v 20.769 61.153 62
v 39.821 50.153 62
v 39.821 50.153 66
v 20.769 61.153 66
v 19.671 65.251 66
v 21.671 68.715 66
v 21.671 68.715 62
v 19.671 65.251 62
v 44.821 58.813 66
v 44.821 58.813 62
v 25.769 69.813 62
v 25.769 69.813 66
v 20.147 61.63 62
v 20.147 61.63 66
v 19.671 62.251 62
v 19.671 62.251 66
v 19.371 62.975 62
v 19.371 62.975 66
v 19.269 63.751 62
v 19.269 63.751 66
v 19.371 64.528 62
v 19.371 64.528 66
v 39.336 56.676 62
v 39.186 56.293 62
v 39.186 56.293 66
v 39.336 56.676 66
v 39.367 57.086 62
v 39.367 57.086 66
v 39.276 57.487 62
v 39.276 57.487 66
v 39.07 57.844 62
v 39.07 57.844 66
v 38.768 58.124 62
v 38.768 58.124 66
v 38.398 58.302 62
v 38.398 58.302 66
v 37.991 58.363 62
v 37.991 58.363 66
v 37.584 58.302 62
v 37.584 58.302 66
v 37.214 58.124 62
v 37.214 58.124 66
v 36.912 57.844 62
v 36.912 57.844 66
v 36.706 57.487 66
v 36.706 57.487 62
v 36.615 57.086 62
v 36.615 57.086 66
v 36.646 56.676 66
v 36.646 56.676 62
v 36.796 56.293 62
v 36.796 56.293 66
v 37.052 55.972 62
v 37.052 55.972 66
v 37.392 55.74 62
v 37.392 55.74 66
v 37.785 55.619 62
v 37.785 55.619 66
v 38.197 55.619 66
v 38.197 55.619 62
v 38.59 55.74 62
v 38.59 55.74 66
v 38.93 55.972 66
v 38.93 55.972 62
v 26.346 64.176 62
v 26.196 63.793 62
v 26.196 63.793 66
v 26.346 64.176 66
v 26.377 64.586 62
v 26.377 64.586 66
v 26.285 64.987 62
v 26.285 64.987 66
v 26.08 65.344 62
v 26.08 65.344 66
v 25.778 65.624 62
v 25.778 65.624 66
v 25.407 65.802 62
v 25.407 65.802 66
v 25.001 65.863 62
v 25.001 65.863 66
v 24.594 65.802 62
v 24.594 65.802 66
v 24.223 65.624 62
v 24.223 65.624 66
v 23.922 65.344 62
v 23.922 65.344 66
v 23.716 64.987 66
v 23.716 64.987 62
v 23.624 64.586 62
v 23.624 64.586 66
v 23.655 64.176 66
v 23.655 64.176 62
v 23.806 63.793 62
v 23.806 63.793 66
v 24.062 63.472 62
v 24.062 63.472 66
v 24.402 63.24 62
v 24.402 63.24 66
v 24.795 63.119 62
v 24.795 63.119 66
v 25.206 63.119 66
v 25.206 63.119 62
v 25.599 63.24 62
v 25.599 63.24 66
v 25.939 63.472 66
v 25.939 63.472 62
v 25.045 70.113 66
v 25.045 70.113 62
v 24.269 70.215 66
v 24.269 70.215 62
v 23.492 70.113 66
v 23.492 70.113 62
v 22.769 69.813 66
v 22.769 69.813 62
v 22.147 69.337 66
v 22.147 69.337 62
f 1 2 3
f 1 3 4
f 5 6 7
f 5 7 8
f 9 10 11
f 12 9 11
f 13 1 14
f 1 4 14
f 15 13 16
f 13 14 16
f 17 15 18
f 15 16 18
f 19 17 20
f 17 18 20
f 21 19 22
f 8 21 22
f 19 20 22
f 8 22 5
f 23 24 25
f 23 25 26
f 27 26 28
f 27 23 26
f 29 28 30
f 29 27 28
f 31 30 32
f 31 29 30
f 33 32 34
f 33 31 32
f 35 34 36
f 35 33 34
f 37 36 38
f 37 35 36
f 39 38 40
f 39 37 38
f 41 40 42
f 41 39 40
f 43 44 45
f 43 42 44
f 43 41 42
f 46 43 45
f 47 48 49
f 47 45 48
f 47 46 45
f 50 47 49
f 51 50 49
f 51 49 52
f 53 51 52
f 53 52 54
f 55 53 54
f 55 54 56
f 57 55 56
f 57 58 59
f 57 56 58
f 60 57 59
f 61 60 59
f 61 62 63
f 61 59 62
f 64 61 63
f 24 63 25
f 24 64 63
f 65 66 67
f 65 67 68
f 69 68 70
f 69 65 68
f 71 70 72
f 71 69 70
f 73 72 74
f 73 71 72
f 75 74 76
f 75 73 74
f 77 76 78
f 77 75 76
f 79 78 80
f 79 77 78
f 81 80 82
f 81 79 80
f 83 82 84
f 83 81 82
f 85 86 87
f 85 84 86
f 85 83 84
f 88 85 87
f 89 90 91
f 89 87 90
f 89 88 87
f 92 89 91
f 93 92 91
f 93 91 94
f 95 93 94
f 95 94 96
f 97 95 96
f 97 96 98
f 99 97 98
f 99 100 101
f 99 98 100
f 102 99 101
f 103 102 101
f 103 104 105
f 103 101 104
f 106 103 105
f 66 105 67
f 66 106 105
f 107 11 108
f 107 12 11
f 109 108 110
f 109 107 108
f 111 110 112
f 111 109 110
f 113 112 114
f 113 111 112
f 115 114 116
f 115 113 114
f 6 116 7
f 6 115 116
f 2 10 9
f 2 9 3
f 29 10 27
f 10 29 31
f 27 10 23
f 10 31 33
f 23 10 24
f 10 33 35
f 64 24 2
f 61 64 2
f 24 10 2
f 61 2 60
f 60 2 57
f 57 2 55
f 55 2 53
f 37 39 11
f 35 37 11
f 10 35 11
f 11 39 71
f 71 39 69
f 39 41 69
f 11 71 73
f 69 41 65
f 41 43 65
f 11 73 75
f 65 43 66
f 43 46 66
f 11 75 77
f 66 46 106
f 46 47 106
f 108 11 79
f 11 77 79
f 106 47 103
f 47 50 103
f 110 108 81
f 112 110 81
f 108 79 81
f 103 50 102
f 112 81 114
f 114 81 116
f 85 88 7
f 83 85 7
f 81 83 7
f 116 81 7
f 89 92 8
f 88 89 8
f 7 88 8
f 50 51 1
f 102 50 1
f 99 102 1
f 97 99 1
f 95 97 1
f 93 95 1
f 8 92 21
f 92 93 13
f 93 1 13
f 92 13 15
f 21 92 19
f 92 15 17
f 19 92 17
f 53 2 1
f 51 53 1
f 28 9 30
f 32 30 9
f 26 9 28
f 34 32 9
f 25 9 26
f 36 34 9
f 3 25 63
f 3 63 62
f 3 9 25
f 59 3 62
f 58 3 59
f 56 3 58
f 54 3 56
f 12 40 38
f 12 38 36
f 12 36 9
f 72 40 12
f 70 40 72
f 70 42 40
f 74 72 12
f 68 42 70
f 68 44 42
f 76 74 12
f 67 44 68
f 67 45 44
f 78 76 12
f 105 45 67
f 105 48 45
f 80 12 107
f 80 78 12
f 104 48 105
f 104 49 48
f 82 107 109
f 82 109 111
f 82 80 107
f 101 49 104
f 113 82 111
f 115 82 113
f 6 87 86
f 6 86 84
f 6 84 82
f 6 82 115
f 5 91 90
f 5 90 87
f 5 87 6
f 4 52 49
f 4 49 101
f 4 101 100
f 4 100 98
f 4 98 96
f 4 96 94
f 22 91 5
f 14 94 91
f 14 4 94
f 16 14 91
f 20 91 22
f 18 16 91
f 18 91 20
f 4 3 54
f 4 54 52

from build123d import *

# Parameters (mm, degrees)
CYLINDER045_R          = 1.38
CYLINDER045_DEPTH      = 10
CYLINDER044_R          = 1.38
CYLINDER044_DEPTH      = 10
BOX026_W               = 25
BOX026_H               = 10
BOX026_DEPTH           = 4
CUT024_PLACEMENT_ANGLE = 30
FILLET001_R            = 3


with BuildPart() as cylinder045:
    # Cylinder045 → Cylinder045 (new body)
    with BuildSketch(Plane(origin=(25, 52, 59), x_dir=(1, 0, 0), z_dir=(0, 0, 1))):
        Circle(CYLINDER045_R)
    extrude(amount=CYLINDER045_DEPTH)


with BuildPart() as cylinder044:
    # Cylinder044 → Cylinder044 (new body)
    with BuildSketch(Plane(origin=(40, 52, 59), x_dir=(1, 0, 0), z_dir=(0, 0, 1))):
        Circle(CYLINDER044_R)
    extrude(amount=CYLINDER044_DEPTH)


with BuildPart() as fillet001:
    # Box026 → Box026 (new body)
    with BuildSketch(Plane(origin=(45, 57, 62), x_dir=(-1, 0, 0), z_dir=(0, 0, 1))):
        with Locations((12.5, 5)):
            Rectangle(BOX026_W, BOX026_H)
    extrude(amount=BOX026_DEPTH)

    # Cut025: cut Cylinder044
    add(cylinder044.part, mode=Mode.SUBTRACT)

    # Cut024: cut Cylinder045
    add(cylinder045.part, mode=Mode.SUBTRACT)


with BuildPart() as fillet001_1:
    # Cut024 placement: moved
    add(fillet001.part.moved(Location((-20.65, 26.95, 0))).rotate(Axis((-20.65, 26.95, 0), (0, 0, -1)), CUT024_PLACEMENT_ANGLE))

    # Fillet001
    fillet001_edges = [fillet001_1.edges().sort_by_distance(p)[0] for p in [
        (25.170508, 66.313448, 64),
        (20.170508, 57.653194, 64),
    ]]
    fillet(fillet001_edges, radius=FILLET001_R)


with BuildPart() as fillet001_2:
    # Fillet001 placement: moved
    add(fillet001_1.part.moved(Location((-2, 5, 0))))


solid = fillet001_2.part
